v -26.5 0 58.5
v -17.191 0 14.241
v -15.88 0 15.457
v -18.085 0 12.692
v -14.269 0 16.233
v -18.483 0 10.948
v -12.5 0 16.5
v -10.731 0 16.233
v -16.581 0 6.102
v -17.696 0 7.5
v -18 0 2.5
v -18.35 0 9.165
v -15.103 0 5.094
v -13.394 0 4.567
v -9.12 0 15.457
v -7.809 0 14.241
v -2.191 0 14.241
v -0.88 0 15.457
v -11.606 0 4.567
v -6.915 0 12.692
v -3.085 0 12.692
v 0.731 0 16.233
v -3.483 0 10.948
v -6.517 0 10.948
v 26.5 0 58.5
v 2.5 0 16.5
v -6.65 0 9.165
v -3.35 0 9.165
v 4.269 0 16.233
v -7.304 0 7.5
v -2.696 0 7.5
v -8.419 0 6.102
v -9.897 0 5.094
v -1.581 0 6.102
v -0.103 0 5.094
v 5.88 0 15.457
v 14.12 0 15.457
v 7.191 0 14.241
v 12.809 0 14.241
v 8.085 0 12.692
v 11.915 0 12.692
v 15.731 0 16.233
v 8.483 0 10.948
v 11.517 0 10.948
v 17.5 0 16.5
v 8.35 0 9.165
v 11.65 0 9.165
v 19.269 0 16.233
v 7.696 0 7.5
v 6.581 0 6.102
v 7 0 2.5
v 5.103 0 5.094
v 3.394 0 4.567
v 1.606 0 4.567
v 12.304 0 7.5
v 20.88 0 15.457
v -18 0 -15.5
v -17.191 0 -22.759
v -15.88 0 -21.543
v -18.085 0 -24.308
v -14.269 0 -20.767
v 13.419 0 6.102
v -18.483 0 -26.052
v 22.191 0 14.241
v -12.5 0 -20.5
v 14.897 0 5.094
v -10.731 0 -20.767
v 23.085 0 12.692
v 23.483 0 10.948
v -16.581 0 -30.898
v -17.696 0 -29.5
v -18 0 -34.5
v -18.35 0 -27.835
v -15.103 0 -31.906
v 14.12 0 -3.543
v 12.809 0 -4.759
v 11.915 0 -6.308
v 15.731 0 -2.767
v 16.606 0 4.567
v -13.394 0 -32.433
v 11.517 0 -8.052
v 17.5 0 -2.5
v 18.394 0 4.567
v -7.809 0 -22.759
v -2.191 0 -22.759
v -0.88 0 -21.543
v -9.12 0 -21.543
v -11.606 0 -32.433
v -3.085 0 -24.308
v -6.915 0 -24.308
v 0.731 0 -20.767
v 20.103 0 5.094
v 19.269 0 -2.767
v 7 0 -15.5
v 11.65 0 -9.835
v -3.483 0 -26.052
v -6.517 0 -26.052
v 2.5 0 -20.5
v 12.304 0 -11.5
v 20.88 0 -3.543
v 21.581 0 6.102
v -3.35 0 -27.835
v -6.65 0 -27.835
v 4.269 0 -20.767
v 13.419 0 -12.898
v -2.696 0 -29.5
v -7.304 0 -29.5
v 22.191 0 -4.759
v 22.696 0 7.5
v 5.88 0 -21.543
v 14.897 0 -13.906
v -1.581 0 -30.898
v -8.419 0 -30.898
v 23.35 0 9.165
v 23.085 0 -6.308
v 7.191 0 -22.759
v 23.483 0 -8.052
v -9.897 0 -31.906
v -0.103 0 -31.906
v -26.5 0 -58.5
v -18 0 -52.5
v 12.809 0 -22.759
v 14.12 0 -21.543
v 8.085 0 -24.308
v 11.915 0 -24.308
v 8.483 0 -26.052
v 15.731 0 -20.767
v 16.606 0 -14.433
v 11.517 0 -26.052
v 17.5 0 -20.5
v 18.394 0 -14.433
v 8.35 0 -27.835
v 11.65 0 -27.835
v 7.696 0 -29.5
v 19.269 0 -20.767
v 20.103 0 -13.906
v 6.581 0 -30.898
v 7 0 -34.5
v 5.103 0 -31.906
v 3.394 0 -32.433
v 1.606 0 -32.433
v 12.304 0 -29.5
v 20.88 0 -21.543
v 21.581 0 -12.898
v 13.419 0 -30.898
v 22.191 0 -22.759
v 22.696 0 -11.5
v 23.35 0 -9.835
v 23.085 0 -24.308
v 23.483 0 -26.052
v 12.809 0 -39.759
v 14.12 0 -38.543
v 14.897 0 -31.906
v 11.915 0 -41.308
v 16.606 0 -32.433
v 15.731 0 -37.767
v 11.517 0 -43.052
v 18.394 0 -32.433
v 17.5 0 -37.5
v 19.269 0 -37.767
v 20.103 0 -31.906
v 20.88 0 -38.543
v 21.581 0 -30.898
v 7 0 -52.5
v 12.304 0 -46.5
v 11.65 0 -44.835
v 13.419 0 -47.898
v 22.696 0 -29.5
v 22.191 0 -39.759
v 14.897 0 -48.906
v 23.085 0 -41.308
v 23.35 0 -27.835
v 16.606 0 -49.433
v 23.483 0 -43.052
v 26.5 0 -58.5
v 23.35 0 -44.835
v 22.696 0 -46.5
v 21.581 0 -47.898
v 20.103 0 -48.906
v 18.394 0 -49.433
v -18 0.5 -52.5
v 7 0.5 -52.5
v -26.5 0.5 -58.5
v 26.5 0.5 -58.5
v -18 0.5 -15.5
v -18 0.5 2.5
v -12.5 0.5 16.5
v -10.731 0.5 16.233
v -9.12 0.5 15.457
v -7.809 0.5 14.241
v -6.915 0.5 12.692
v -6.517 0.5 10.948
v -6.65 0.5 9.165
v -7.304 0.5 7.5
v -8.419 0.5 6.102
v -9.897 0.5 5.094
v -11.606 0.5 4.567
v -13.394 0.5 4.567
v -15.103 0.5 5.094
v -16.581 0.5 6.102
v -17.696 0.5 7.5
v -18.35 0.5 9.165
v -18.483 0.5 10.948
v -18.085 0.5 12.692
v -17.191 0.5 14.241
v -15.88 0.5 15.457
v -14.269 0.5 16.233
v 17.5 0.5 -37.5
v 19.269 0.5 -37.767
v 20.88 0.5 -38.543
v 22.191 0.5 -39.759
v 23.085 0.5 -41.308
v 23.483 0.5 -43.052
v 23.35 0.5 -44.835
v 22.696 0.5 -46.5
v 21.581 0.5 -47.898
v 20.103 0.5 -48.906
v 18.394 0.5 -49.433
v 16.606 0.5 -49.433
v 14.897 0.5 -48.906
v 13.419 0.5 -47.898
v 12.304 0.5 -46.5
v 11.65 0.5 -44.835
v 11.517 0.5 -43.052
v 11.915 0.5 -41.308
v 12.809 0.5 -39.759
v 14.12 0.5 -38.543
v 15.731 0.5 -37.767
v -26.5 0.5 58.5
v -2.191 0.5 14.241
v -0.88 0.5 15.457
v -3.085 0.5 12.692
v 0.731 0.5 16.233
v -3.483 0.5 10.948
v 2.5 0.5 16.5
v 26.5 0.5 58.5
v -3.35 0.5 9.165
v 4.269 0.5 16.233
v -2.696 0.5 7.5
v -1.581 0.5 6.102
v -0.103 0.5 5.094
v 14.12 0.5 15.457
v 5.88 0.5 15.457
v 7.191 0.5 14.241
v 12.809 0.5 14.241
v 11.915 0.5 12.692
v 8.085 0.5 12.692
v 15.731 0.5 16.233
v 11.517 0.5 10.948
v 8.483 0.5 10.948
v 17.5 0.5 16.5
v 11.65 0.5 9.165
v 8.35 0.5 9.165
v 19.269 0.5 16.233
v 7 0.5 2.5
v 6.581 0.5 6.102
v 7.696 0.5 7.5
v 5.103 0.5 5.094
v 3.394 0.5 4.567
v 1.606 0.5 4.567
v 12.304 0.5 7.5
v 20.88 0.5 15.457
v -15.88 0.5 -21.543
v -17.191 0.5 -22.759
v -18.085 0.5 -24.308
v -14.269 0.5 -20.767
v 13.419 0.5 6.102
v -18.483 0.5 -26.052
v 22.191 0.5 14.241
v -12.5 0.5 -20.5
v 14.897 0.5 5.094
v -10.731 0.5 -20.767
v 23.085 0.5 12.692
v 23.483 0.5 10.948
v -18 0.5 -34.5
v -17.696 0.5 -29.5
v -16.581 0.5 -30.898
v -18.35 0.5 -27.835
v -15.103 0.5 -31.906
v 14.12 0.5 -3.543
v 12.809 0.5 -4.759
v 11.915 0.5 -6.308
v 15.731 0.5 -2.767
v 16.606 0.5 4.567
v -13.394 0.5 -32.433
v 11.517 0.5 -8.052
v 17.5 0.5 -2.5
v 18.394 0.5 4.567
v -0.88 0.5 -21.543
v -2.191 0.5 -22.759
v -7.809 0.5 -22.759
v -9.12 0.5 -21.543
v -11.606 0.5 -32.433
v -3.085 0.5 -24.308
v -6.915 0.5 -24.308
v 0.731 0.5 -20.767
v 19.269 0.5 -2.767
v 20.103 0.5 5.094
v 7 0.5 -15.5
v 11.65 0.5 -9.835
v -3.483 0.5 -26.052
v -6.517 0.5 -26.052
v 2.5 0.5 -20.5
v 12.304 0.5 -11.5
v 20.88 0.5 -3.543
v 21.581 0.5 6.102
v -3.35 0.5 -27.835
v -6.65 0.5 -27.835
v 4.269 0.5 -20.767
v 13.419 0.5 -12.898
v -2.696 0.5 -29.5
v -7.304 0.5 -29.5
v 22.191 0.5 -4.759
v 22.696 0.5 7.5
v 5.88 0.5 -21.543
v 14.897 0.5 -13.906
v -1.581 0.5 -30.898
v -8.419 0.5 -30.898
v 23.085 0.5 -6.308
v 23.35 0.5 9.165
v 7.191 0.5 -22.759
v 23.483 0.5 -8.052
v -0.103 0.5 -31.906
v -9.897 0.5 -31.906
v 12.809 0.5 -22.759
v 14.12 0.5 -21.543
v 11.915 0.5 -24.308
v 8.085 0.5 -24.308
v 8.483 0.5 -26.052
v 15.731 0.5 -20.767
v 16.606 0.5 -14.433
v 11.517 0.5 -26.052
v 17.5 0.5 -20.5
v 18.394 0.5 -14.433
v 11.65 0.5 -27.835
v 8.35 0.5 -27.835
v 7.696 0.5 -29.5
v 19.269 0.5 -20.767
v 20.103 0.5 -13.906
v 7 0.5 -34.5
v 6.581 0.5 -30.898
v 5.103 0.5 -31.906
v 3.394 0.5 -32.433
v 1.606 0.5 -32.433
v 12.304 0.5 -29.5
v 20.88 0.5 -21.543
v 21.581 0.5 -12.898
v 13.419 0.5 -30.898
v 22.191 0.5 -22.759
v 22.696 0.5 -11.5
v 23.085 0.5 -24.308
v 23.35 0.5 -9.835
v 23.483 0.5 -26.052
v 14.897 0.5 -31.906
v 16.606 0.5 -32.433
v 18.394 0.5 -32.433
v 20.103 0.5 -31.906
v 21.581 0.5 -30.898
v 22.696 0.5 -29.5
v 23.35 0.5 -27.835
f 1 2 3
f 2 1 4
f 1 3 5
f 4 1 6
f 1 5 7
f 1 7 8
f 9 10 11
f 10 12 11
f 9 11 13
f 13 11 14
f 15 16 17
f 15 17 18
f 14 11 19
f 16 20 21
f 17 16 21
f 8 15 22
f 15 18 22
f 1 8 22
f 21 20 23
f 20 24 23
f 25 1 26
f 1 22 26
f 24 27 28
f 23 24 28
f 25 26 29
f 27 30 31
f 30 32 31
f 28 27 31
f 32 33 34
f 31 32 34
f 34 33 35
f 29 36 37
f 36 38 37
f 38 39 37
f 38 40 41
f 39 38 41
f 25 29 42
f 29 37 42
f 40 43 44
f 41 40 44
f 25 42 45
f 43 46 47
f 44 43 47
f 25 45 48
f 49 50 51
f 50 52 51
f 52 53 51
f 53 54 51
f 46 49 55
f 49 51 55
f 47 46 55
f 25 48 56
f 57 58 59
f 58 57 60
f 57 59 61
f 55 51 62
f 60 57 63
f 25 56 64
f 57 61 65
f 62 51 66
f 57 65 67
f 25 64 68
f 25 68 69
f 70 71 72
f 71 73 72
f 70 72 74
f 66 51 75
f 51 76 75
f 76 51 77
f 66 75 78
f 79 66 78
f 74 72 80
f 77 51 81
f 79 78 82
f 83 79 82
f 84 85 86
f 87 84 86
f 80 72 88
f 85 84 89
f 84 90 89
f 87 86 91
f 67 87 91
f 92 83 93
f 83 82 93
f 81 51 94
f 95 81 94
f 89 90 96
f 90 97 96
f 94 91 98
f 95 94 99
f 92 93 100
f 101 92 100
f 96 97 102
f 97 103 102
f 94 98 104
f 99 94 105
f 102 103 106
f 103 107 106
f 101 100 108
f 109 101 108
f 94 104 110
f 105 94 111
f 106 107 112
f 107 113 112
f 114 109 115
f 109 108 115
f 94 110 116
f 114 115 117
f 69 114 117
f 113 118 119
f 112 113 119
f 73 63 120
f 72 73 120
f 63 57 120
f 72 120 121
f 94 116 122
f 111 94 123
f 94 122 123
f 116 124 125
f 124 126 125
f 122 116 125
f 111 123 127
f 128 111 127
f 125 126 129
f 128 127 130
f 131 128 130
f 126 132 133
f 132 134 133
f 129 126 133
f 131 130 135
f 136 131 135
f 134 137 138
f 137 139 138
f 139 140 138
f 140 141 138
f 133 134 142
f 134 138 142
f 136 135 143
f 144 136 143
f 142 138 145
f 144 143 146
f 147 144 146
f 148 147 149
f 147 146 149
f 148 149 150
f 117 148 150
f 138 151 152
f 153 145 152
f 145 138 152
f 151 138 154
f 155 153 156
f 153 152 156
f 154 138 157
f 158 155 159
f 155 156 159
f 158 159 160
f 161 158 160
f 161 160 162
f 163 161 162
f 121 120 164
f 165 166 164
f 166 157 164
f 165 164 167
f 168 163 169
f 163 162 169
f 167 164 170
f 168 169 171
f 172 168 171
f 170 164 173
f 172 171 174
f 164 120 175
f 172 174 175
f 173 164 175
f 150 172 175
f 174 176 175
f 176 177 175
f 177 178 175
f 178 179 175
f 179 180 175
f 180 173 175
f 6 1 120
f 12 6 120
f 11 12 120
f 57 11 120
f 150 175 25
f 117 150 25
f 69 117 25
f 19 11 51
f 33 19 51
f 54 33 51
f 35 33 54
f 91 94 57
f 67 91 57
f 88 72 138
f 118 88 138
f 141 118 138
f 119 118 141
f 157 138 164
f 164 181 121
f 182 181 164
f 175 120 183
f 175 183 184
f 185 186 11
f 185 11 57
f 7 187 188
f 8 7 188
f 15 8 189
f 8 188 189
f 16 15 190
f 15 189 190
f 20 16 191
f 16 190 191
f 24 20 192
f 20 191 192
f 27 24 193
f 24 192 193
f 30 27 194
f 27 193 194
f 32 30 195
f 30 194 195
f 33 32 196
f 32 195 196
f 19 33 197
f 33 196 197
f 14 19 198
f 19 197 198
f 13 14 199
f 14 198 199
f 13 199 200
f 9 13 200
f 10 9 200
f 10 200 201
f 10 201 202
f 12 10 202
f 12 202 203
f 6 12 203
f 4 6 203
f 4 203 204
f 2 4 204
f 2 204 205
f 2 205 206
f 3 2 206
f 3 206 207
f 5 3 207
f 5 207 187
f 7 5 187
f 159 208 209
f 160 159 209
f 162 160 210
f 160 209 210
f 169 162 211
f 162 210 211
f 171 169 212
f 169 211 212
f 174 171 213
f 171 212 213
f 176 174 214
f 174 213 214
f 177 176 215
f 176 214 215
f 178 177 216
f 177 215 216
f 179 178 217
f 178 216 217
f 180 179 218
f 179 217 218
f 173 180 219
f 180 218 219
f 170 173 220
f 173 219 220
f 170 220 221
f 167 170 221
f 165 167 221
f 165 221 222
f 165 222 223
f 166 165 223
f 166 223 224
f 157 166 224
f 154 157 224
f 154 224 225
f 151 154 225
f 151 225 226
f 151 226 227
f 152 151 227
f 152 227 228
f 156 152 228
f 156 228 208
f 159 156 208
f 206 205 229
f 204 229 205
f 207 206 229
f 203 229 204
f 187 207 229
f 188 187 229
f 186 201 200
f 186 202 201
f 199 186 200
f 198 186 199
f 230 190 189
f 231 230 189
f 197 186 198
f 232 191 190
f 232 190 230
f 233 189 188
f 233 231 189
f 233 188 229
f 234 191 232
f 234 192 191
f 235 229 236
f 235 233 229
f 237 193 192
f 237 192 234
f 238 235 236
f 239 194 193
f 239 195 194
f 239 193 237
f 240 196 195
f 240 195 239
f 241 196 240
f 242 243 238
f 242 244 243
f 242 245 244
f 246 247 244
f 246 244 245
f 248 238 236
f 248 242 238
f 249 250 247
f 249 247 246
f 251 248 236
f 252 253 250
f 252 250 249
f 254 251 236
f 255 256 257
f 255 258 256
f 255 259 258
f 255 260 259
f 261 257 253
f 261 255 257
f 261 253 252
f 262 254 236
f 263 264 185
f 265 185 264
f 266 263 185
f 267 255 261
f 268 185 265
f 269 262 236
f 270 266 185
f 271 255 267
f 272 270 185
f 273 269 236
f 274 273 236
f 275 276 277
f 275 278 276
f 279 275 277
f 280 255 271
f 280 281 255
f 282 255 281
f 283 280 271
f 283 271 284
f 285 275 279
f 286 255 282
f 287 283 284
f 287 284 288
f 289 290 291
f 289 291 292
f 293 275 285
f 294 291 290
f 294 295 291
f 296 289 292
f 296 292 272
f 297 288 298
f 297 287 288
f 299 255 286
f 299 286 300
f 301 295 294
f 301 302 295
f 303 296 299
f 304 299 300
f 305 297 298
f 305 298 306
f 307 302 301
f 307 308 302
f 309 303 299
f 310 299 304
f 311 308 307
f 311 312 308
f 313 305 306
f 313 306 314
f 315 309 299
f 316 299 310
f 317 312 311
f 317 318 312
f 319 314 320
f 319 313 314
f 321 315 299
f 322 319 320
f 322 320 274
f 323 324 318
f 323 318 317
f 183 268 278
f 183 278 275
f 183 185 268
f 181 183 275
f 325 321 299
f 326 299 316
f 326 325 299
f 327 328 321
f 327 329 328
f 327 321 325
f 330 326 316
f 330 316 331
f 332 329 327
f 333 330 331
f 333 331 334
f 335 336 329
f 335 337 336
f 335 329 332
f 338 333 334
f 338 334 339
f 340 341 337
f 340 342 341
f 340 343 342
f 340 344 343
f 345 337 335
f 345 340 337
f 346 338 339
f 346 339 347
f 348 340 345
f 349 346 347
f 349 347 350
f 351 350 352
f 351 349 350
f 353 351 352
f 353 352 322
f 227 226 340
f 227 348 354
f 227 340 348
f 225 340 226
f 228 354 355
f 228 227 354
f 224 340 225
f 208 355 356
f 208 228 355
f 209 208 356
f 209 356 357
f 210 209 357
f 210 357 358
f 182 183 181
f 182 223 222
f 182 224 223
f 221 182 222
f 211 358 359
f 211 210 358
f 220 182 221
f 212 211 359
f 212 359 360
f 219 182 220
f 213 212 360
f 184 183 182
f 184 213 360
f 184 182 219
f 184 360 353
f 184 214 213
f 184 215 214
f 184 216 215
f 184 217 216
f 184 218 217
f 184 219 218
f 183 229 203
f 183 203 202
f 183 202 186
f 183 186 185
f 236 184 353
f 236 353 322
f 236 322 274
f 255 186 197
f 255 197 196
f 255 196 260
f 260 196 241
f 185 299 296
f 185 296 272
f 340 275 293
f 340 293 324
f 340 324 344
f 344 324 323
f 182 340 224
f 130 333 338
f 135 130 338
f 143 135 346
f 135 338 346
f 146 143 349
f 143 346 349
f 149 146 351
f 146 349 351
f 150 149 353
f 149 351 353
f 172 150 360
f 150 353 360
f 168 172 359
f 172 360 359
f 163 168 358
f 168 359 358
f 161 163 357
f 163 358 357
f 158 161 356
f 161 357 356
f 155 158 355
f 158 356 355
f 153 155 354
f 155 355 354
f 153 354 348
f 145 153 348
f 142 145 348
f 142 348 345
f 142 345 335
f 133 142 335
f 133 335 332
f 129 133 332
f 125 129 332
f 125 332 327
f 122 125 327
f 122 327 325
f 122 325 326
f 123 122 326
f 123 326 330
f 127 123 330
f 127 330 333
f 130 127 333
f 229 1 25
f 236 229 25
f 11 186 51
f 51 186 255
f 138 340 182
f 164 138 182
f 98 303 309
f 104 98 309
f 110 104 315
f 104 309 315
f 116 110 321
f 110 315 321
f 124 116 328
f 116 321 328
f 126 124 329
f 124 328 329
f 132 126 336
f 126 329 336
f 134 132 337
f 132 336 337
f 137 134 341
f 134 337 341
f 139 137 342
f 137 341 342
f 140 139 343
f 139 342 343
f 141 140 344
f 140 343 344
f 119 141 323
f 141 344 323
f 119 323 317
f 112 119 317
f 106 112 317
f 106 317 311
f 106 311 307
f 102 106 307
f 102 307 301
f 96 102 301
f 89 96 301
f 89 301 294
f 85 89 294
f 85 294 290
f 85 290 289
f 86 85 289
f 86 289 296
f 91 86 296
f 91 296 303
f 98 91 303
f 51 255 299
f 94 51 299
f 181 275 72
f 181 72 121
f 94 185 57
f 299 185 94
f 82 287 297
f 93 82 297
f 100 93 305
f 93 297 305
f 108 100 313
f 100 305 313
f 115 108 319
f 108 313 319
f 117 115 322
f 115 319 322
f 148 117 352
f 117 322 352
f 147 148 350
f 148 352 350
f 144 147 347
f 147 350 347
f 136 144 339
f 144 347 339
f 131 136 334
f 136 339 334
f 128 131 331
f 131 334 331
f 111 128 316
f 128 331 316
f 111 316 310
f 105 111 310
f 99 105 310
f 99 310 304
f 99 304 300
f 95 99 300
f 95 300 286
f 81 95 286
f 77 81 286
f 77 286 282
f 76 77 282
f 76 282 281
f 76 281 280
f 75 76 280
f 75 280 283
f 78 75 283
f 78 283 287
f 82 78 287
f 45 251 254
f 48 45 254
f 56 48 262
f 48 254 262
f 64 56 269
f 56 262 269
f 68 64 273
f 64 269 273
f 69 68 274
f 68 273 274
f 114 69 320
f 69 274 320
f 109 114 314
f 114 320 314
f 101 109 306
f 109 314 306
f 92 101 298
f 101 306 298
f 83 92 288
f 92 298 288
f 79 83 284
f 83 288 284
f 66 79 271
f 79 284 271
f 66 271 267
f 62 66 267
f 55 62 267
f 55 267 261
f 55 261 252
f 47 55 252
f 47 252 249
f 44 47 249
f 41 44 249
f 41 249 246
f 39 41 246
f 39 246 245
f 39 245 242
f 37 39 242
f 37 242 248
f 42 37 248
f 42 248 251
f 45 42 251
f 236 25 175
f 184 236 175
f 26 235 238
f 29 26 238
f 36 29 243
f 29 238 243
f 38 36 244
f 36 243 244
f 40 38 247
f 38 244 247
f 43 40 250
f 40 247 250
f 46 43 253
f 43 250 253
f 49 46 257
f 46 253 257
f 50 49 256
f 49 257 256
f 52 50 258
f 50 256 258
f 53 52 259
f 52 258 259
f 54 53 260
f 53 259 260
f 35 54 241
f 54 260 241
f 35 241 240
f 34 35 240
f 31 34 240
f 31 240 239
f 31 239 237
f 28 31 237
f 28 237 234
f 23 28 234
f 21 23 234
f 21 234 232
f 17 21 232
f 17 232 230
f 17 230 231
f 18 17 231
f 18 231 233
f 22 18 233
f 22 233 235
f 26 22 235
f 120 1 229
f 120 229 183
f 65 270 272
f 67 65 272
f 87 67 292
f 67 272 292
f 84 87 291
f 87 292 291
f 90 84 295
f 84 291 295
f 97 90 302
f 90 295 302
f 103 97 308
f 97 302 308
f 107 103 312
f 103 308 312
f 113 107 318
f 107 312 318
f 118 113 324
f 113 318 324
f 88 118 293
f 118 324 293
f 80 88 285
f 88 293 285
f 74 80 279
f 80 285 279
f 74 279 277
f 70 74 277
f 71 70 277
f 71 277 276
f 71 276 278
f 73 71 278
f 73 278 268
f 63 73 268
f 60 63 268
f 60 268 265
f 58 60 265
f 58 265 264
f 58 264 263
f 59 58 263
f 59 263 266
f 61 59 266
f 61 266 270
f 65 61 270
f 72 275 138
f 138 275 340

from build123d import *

# Parameters (mm, degrees)
SKETCH_1_W          = 53
SKETCH_1_H          = 117
EXTRUDE_1_DEPTH     = 0.5
SKETCH_2_W          = 25
SKETCH_2_H          = 18
CUT_EXTRUDE_1_DEPTH = 65.224216616
SKETCH_4_R          = 6
CUT_EXTRUDE_2_DEPTH = 65.224216616


with BuildPart() as part:
    # Эскиз1 → Бобышка-Вытянуть1 (new body)
    with BuildSketch(Plane(origin=(0, 0, 0), x_dir=(1, 0, 0), z_dir=(0, 1, 0))):
        Rectangle(SKETCH_1_W, SKETCH_1_H)
    extrude(amount=EXTRUDE_1_DEPTH)

    # Эскиз2 → Вырез-Вытянуть1 (cut, through all)
    with BuildSketch(Plane(origin=(0, 0.5, 0), x_dir=(1, 0, 0), z_dir=(0, 1, 0))):
        with Locations((-5.5, 43.5)):
            Rectangle(SKETCH_2_W, SKETCH_2_H)
        with Locations((-5.5, 6.5)):
            Rectangle(SKETCH_2_W, SKETCH_2_H)
    extrude(amount=-CUT_EXTRUDE_1_DEPTH, mode=Mode.SUBTRACT)

    # Эскиз4 → Вырез-Вытянуть2 (cut, through all)
    with BuildSketch(Plane(origin=(0, 0.5, 0), x_dir=(1, 0, 0), z_dir=(0, 1, 0))):
        with Locations(Location((17.5, 43.5, 0), (0, 0, 270))):
            Circle(SKETCH_4_R)
        with Locations(Location((17.5, 26.5, 0), (0, 0, 270))):
            Circle(SKETCH_4_R)
        with Locations(Location((17.5, 8.5, 0), (0, 0, 270))):
            Circle(SKETCH_4_R)
        with Locations(Location((17.5, -10.5, 0), (0, 0, 270))):
            Circle(SKETCH_4_R)
        with Locations(Location((2.5, 26.5, 0), (0, 0, 270))):
            Circle(SKETCH_4_R)
        with Locations(Location((-12.5, 26.5, 0), (0, 0, 270))):
            Circle(SKETCH_4_R)
        with Locations(Location((2.5, -10.5, 0), (0, 0, 270))):
            Circle(SKETCH_4_R)
        with Locations(Location((-12.5, -10.5, 0), (0, 0, 270))):
            Circle(SKETCH_4_R)
    extrude(amount=-CUT_EXTRUDE_2_DEPTH, mode=Mode.SUBTRACT)


solid = part.part
